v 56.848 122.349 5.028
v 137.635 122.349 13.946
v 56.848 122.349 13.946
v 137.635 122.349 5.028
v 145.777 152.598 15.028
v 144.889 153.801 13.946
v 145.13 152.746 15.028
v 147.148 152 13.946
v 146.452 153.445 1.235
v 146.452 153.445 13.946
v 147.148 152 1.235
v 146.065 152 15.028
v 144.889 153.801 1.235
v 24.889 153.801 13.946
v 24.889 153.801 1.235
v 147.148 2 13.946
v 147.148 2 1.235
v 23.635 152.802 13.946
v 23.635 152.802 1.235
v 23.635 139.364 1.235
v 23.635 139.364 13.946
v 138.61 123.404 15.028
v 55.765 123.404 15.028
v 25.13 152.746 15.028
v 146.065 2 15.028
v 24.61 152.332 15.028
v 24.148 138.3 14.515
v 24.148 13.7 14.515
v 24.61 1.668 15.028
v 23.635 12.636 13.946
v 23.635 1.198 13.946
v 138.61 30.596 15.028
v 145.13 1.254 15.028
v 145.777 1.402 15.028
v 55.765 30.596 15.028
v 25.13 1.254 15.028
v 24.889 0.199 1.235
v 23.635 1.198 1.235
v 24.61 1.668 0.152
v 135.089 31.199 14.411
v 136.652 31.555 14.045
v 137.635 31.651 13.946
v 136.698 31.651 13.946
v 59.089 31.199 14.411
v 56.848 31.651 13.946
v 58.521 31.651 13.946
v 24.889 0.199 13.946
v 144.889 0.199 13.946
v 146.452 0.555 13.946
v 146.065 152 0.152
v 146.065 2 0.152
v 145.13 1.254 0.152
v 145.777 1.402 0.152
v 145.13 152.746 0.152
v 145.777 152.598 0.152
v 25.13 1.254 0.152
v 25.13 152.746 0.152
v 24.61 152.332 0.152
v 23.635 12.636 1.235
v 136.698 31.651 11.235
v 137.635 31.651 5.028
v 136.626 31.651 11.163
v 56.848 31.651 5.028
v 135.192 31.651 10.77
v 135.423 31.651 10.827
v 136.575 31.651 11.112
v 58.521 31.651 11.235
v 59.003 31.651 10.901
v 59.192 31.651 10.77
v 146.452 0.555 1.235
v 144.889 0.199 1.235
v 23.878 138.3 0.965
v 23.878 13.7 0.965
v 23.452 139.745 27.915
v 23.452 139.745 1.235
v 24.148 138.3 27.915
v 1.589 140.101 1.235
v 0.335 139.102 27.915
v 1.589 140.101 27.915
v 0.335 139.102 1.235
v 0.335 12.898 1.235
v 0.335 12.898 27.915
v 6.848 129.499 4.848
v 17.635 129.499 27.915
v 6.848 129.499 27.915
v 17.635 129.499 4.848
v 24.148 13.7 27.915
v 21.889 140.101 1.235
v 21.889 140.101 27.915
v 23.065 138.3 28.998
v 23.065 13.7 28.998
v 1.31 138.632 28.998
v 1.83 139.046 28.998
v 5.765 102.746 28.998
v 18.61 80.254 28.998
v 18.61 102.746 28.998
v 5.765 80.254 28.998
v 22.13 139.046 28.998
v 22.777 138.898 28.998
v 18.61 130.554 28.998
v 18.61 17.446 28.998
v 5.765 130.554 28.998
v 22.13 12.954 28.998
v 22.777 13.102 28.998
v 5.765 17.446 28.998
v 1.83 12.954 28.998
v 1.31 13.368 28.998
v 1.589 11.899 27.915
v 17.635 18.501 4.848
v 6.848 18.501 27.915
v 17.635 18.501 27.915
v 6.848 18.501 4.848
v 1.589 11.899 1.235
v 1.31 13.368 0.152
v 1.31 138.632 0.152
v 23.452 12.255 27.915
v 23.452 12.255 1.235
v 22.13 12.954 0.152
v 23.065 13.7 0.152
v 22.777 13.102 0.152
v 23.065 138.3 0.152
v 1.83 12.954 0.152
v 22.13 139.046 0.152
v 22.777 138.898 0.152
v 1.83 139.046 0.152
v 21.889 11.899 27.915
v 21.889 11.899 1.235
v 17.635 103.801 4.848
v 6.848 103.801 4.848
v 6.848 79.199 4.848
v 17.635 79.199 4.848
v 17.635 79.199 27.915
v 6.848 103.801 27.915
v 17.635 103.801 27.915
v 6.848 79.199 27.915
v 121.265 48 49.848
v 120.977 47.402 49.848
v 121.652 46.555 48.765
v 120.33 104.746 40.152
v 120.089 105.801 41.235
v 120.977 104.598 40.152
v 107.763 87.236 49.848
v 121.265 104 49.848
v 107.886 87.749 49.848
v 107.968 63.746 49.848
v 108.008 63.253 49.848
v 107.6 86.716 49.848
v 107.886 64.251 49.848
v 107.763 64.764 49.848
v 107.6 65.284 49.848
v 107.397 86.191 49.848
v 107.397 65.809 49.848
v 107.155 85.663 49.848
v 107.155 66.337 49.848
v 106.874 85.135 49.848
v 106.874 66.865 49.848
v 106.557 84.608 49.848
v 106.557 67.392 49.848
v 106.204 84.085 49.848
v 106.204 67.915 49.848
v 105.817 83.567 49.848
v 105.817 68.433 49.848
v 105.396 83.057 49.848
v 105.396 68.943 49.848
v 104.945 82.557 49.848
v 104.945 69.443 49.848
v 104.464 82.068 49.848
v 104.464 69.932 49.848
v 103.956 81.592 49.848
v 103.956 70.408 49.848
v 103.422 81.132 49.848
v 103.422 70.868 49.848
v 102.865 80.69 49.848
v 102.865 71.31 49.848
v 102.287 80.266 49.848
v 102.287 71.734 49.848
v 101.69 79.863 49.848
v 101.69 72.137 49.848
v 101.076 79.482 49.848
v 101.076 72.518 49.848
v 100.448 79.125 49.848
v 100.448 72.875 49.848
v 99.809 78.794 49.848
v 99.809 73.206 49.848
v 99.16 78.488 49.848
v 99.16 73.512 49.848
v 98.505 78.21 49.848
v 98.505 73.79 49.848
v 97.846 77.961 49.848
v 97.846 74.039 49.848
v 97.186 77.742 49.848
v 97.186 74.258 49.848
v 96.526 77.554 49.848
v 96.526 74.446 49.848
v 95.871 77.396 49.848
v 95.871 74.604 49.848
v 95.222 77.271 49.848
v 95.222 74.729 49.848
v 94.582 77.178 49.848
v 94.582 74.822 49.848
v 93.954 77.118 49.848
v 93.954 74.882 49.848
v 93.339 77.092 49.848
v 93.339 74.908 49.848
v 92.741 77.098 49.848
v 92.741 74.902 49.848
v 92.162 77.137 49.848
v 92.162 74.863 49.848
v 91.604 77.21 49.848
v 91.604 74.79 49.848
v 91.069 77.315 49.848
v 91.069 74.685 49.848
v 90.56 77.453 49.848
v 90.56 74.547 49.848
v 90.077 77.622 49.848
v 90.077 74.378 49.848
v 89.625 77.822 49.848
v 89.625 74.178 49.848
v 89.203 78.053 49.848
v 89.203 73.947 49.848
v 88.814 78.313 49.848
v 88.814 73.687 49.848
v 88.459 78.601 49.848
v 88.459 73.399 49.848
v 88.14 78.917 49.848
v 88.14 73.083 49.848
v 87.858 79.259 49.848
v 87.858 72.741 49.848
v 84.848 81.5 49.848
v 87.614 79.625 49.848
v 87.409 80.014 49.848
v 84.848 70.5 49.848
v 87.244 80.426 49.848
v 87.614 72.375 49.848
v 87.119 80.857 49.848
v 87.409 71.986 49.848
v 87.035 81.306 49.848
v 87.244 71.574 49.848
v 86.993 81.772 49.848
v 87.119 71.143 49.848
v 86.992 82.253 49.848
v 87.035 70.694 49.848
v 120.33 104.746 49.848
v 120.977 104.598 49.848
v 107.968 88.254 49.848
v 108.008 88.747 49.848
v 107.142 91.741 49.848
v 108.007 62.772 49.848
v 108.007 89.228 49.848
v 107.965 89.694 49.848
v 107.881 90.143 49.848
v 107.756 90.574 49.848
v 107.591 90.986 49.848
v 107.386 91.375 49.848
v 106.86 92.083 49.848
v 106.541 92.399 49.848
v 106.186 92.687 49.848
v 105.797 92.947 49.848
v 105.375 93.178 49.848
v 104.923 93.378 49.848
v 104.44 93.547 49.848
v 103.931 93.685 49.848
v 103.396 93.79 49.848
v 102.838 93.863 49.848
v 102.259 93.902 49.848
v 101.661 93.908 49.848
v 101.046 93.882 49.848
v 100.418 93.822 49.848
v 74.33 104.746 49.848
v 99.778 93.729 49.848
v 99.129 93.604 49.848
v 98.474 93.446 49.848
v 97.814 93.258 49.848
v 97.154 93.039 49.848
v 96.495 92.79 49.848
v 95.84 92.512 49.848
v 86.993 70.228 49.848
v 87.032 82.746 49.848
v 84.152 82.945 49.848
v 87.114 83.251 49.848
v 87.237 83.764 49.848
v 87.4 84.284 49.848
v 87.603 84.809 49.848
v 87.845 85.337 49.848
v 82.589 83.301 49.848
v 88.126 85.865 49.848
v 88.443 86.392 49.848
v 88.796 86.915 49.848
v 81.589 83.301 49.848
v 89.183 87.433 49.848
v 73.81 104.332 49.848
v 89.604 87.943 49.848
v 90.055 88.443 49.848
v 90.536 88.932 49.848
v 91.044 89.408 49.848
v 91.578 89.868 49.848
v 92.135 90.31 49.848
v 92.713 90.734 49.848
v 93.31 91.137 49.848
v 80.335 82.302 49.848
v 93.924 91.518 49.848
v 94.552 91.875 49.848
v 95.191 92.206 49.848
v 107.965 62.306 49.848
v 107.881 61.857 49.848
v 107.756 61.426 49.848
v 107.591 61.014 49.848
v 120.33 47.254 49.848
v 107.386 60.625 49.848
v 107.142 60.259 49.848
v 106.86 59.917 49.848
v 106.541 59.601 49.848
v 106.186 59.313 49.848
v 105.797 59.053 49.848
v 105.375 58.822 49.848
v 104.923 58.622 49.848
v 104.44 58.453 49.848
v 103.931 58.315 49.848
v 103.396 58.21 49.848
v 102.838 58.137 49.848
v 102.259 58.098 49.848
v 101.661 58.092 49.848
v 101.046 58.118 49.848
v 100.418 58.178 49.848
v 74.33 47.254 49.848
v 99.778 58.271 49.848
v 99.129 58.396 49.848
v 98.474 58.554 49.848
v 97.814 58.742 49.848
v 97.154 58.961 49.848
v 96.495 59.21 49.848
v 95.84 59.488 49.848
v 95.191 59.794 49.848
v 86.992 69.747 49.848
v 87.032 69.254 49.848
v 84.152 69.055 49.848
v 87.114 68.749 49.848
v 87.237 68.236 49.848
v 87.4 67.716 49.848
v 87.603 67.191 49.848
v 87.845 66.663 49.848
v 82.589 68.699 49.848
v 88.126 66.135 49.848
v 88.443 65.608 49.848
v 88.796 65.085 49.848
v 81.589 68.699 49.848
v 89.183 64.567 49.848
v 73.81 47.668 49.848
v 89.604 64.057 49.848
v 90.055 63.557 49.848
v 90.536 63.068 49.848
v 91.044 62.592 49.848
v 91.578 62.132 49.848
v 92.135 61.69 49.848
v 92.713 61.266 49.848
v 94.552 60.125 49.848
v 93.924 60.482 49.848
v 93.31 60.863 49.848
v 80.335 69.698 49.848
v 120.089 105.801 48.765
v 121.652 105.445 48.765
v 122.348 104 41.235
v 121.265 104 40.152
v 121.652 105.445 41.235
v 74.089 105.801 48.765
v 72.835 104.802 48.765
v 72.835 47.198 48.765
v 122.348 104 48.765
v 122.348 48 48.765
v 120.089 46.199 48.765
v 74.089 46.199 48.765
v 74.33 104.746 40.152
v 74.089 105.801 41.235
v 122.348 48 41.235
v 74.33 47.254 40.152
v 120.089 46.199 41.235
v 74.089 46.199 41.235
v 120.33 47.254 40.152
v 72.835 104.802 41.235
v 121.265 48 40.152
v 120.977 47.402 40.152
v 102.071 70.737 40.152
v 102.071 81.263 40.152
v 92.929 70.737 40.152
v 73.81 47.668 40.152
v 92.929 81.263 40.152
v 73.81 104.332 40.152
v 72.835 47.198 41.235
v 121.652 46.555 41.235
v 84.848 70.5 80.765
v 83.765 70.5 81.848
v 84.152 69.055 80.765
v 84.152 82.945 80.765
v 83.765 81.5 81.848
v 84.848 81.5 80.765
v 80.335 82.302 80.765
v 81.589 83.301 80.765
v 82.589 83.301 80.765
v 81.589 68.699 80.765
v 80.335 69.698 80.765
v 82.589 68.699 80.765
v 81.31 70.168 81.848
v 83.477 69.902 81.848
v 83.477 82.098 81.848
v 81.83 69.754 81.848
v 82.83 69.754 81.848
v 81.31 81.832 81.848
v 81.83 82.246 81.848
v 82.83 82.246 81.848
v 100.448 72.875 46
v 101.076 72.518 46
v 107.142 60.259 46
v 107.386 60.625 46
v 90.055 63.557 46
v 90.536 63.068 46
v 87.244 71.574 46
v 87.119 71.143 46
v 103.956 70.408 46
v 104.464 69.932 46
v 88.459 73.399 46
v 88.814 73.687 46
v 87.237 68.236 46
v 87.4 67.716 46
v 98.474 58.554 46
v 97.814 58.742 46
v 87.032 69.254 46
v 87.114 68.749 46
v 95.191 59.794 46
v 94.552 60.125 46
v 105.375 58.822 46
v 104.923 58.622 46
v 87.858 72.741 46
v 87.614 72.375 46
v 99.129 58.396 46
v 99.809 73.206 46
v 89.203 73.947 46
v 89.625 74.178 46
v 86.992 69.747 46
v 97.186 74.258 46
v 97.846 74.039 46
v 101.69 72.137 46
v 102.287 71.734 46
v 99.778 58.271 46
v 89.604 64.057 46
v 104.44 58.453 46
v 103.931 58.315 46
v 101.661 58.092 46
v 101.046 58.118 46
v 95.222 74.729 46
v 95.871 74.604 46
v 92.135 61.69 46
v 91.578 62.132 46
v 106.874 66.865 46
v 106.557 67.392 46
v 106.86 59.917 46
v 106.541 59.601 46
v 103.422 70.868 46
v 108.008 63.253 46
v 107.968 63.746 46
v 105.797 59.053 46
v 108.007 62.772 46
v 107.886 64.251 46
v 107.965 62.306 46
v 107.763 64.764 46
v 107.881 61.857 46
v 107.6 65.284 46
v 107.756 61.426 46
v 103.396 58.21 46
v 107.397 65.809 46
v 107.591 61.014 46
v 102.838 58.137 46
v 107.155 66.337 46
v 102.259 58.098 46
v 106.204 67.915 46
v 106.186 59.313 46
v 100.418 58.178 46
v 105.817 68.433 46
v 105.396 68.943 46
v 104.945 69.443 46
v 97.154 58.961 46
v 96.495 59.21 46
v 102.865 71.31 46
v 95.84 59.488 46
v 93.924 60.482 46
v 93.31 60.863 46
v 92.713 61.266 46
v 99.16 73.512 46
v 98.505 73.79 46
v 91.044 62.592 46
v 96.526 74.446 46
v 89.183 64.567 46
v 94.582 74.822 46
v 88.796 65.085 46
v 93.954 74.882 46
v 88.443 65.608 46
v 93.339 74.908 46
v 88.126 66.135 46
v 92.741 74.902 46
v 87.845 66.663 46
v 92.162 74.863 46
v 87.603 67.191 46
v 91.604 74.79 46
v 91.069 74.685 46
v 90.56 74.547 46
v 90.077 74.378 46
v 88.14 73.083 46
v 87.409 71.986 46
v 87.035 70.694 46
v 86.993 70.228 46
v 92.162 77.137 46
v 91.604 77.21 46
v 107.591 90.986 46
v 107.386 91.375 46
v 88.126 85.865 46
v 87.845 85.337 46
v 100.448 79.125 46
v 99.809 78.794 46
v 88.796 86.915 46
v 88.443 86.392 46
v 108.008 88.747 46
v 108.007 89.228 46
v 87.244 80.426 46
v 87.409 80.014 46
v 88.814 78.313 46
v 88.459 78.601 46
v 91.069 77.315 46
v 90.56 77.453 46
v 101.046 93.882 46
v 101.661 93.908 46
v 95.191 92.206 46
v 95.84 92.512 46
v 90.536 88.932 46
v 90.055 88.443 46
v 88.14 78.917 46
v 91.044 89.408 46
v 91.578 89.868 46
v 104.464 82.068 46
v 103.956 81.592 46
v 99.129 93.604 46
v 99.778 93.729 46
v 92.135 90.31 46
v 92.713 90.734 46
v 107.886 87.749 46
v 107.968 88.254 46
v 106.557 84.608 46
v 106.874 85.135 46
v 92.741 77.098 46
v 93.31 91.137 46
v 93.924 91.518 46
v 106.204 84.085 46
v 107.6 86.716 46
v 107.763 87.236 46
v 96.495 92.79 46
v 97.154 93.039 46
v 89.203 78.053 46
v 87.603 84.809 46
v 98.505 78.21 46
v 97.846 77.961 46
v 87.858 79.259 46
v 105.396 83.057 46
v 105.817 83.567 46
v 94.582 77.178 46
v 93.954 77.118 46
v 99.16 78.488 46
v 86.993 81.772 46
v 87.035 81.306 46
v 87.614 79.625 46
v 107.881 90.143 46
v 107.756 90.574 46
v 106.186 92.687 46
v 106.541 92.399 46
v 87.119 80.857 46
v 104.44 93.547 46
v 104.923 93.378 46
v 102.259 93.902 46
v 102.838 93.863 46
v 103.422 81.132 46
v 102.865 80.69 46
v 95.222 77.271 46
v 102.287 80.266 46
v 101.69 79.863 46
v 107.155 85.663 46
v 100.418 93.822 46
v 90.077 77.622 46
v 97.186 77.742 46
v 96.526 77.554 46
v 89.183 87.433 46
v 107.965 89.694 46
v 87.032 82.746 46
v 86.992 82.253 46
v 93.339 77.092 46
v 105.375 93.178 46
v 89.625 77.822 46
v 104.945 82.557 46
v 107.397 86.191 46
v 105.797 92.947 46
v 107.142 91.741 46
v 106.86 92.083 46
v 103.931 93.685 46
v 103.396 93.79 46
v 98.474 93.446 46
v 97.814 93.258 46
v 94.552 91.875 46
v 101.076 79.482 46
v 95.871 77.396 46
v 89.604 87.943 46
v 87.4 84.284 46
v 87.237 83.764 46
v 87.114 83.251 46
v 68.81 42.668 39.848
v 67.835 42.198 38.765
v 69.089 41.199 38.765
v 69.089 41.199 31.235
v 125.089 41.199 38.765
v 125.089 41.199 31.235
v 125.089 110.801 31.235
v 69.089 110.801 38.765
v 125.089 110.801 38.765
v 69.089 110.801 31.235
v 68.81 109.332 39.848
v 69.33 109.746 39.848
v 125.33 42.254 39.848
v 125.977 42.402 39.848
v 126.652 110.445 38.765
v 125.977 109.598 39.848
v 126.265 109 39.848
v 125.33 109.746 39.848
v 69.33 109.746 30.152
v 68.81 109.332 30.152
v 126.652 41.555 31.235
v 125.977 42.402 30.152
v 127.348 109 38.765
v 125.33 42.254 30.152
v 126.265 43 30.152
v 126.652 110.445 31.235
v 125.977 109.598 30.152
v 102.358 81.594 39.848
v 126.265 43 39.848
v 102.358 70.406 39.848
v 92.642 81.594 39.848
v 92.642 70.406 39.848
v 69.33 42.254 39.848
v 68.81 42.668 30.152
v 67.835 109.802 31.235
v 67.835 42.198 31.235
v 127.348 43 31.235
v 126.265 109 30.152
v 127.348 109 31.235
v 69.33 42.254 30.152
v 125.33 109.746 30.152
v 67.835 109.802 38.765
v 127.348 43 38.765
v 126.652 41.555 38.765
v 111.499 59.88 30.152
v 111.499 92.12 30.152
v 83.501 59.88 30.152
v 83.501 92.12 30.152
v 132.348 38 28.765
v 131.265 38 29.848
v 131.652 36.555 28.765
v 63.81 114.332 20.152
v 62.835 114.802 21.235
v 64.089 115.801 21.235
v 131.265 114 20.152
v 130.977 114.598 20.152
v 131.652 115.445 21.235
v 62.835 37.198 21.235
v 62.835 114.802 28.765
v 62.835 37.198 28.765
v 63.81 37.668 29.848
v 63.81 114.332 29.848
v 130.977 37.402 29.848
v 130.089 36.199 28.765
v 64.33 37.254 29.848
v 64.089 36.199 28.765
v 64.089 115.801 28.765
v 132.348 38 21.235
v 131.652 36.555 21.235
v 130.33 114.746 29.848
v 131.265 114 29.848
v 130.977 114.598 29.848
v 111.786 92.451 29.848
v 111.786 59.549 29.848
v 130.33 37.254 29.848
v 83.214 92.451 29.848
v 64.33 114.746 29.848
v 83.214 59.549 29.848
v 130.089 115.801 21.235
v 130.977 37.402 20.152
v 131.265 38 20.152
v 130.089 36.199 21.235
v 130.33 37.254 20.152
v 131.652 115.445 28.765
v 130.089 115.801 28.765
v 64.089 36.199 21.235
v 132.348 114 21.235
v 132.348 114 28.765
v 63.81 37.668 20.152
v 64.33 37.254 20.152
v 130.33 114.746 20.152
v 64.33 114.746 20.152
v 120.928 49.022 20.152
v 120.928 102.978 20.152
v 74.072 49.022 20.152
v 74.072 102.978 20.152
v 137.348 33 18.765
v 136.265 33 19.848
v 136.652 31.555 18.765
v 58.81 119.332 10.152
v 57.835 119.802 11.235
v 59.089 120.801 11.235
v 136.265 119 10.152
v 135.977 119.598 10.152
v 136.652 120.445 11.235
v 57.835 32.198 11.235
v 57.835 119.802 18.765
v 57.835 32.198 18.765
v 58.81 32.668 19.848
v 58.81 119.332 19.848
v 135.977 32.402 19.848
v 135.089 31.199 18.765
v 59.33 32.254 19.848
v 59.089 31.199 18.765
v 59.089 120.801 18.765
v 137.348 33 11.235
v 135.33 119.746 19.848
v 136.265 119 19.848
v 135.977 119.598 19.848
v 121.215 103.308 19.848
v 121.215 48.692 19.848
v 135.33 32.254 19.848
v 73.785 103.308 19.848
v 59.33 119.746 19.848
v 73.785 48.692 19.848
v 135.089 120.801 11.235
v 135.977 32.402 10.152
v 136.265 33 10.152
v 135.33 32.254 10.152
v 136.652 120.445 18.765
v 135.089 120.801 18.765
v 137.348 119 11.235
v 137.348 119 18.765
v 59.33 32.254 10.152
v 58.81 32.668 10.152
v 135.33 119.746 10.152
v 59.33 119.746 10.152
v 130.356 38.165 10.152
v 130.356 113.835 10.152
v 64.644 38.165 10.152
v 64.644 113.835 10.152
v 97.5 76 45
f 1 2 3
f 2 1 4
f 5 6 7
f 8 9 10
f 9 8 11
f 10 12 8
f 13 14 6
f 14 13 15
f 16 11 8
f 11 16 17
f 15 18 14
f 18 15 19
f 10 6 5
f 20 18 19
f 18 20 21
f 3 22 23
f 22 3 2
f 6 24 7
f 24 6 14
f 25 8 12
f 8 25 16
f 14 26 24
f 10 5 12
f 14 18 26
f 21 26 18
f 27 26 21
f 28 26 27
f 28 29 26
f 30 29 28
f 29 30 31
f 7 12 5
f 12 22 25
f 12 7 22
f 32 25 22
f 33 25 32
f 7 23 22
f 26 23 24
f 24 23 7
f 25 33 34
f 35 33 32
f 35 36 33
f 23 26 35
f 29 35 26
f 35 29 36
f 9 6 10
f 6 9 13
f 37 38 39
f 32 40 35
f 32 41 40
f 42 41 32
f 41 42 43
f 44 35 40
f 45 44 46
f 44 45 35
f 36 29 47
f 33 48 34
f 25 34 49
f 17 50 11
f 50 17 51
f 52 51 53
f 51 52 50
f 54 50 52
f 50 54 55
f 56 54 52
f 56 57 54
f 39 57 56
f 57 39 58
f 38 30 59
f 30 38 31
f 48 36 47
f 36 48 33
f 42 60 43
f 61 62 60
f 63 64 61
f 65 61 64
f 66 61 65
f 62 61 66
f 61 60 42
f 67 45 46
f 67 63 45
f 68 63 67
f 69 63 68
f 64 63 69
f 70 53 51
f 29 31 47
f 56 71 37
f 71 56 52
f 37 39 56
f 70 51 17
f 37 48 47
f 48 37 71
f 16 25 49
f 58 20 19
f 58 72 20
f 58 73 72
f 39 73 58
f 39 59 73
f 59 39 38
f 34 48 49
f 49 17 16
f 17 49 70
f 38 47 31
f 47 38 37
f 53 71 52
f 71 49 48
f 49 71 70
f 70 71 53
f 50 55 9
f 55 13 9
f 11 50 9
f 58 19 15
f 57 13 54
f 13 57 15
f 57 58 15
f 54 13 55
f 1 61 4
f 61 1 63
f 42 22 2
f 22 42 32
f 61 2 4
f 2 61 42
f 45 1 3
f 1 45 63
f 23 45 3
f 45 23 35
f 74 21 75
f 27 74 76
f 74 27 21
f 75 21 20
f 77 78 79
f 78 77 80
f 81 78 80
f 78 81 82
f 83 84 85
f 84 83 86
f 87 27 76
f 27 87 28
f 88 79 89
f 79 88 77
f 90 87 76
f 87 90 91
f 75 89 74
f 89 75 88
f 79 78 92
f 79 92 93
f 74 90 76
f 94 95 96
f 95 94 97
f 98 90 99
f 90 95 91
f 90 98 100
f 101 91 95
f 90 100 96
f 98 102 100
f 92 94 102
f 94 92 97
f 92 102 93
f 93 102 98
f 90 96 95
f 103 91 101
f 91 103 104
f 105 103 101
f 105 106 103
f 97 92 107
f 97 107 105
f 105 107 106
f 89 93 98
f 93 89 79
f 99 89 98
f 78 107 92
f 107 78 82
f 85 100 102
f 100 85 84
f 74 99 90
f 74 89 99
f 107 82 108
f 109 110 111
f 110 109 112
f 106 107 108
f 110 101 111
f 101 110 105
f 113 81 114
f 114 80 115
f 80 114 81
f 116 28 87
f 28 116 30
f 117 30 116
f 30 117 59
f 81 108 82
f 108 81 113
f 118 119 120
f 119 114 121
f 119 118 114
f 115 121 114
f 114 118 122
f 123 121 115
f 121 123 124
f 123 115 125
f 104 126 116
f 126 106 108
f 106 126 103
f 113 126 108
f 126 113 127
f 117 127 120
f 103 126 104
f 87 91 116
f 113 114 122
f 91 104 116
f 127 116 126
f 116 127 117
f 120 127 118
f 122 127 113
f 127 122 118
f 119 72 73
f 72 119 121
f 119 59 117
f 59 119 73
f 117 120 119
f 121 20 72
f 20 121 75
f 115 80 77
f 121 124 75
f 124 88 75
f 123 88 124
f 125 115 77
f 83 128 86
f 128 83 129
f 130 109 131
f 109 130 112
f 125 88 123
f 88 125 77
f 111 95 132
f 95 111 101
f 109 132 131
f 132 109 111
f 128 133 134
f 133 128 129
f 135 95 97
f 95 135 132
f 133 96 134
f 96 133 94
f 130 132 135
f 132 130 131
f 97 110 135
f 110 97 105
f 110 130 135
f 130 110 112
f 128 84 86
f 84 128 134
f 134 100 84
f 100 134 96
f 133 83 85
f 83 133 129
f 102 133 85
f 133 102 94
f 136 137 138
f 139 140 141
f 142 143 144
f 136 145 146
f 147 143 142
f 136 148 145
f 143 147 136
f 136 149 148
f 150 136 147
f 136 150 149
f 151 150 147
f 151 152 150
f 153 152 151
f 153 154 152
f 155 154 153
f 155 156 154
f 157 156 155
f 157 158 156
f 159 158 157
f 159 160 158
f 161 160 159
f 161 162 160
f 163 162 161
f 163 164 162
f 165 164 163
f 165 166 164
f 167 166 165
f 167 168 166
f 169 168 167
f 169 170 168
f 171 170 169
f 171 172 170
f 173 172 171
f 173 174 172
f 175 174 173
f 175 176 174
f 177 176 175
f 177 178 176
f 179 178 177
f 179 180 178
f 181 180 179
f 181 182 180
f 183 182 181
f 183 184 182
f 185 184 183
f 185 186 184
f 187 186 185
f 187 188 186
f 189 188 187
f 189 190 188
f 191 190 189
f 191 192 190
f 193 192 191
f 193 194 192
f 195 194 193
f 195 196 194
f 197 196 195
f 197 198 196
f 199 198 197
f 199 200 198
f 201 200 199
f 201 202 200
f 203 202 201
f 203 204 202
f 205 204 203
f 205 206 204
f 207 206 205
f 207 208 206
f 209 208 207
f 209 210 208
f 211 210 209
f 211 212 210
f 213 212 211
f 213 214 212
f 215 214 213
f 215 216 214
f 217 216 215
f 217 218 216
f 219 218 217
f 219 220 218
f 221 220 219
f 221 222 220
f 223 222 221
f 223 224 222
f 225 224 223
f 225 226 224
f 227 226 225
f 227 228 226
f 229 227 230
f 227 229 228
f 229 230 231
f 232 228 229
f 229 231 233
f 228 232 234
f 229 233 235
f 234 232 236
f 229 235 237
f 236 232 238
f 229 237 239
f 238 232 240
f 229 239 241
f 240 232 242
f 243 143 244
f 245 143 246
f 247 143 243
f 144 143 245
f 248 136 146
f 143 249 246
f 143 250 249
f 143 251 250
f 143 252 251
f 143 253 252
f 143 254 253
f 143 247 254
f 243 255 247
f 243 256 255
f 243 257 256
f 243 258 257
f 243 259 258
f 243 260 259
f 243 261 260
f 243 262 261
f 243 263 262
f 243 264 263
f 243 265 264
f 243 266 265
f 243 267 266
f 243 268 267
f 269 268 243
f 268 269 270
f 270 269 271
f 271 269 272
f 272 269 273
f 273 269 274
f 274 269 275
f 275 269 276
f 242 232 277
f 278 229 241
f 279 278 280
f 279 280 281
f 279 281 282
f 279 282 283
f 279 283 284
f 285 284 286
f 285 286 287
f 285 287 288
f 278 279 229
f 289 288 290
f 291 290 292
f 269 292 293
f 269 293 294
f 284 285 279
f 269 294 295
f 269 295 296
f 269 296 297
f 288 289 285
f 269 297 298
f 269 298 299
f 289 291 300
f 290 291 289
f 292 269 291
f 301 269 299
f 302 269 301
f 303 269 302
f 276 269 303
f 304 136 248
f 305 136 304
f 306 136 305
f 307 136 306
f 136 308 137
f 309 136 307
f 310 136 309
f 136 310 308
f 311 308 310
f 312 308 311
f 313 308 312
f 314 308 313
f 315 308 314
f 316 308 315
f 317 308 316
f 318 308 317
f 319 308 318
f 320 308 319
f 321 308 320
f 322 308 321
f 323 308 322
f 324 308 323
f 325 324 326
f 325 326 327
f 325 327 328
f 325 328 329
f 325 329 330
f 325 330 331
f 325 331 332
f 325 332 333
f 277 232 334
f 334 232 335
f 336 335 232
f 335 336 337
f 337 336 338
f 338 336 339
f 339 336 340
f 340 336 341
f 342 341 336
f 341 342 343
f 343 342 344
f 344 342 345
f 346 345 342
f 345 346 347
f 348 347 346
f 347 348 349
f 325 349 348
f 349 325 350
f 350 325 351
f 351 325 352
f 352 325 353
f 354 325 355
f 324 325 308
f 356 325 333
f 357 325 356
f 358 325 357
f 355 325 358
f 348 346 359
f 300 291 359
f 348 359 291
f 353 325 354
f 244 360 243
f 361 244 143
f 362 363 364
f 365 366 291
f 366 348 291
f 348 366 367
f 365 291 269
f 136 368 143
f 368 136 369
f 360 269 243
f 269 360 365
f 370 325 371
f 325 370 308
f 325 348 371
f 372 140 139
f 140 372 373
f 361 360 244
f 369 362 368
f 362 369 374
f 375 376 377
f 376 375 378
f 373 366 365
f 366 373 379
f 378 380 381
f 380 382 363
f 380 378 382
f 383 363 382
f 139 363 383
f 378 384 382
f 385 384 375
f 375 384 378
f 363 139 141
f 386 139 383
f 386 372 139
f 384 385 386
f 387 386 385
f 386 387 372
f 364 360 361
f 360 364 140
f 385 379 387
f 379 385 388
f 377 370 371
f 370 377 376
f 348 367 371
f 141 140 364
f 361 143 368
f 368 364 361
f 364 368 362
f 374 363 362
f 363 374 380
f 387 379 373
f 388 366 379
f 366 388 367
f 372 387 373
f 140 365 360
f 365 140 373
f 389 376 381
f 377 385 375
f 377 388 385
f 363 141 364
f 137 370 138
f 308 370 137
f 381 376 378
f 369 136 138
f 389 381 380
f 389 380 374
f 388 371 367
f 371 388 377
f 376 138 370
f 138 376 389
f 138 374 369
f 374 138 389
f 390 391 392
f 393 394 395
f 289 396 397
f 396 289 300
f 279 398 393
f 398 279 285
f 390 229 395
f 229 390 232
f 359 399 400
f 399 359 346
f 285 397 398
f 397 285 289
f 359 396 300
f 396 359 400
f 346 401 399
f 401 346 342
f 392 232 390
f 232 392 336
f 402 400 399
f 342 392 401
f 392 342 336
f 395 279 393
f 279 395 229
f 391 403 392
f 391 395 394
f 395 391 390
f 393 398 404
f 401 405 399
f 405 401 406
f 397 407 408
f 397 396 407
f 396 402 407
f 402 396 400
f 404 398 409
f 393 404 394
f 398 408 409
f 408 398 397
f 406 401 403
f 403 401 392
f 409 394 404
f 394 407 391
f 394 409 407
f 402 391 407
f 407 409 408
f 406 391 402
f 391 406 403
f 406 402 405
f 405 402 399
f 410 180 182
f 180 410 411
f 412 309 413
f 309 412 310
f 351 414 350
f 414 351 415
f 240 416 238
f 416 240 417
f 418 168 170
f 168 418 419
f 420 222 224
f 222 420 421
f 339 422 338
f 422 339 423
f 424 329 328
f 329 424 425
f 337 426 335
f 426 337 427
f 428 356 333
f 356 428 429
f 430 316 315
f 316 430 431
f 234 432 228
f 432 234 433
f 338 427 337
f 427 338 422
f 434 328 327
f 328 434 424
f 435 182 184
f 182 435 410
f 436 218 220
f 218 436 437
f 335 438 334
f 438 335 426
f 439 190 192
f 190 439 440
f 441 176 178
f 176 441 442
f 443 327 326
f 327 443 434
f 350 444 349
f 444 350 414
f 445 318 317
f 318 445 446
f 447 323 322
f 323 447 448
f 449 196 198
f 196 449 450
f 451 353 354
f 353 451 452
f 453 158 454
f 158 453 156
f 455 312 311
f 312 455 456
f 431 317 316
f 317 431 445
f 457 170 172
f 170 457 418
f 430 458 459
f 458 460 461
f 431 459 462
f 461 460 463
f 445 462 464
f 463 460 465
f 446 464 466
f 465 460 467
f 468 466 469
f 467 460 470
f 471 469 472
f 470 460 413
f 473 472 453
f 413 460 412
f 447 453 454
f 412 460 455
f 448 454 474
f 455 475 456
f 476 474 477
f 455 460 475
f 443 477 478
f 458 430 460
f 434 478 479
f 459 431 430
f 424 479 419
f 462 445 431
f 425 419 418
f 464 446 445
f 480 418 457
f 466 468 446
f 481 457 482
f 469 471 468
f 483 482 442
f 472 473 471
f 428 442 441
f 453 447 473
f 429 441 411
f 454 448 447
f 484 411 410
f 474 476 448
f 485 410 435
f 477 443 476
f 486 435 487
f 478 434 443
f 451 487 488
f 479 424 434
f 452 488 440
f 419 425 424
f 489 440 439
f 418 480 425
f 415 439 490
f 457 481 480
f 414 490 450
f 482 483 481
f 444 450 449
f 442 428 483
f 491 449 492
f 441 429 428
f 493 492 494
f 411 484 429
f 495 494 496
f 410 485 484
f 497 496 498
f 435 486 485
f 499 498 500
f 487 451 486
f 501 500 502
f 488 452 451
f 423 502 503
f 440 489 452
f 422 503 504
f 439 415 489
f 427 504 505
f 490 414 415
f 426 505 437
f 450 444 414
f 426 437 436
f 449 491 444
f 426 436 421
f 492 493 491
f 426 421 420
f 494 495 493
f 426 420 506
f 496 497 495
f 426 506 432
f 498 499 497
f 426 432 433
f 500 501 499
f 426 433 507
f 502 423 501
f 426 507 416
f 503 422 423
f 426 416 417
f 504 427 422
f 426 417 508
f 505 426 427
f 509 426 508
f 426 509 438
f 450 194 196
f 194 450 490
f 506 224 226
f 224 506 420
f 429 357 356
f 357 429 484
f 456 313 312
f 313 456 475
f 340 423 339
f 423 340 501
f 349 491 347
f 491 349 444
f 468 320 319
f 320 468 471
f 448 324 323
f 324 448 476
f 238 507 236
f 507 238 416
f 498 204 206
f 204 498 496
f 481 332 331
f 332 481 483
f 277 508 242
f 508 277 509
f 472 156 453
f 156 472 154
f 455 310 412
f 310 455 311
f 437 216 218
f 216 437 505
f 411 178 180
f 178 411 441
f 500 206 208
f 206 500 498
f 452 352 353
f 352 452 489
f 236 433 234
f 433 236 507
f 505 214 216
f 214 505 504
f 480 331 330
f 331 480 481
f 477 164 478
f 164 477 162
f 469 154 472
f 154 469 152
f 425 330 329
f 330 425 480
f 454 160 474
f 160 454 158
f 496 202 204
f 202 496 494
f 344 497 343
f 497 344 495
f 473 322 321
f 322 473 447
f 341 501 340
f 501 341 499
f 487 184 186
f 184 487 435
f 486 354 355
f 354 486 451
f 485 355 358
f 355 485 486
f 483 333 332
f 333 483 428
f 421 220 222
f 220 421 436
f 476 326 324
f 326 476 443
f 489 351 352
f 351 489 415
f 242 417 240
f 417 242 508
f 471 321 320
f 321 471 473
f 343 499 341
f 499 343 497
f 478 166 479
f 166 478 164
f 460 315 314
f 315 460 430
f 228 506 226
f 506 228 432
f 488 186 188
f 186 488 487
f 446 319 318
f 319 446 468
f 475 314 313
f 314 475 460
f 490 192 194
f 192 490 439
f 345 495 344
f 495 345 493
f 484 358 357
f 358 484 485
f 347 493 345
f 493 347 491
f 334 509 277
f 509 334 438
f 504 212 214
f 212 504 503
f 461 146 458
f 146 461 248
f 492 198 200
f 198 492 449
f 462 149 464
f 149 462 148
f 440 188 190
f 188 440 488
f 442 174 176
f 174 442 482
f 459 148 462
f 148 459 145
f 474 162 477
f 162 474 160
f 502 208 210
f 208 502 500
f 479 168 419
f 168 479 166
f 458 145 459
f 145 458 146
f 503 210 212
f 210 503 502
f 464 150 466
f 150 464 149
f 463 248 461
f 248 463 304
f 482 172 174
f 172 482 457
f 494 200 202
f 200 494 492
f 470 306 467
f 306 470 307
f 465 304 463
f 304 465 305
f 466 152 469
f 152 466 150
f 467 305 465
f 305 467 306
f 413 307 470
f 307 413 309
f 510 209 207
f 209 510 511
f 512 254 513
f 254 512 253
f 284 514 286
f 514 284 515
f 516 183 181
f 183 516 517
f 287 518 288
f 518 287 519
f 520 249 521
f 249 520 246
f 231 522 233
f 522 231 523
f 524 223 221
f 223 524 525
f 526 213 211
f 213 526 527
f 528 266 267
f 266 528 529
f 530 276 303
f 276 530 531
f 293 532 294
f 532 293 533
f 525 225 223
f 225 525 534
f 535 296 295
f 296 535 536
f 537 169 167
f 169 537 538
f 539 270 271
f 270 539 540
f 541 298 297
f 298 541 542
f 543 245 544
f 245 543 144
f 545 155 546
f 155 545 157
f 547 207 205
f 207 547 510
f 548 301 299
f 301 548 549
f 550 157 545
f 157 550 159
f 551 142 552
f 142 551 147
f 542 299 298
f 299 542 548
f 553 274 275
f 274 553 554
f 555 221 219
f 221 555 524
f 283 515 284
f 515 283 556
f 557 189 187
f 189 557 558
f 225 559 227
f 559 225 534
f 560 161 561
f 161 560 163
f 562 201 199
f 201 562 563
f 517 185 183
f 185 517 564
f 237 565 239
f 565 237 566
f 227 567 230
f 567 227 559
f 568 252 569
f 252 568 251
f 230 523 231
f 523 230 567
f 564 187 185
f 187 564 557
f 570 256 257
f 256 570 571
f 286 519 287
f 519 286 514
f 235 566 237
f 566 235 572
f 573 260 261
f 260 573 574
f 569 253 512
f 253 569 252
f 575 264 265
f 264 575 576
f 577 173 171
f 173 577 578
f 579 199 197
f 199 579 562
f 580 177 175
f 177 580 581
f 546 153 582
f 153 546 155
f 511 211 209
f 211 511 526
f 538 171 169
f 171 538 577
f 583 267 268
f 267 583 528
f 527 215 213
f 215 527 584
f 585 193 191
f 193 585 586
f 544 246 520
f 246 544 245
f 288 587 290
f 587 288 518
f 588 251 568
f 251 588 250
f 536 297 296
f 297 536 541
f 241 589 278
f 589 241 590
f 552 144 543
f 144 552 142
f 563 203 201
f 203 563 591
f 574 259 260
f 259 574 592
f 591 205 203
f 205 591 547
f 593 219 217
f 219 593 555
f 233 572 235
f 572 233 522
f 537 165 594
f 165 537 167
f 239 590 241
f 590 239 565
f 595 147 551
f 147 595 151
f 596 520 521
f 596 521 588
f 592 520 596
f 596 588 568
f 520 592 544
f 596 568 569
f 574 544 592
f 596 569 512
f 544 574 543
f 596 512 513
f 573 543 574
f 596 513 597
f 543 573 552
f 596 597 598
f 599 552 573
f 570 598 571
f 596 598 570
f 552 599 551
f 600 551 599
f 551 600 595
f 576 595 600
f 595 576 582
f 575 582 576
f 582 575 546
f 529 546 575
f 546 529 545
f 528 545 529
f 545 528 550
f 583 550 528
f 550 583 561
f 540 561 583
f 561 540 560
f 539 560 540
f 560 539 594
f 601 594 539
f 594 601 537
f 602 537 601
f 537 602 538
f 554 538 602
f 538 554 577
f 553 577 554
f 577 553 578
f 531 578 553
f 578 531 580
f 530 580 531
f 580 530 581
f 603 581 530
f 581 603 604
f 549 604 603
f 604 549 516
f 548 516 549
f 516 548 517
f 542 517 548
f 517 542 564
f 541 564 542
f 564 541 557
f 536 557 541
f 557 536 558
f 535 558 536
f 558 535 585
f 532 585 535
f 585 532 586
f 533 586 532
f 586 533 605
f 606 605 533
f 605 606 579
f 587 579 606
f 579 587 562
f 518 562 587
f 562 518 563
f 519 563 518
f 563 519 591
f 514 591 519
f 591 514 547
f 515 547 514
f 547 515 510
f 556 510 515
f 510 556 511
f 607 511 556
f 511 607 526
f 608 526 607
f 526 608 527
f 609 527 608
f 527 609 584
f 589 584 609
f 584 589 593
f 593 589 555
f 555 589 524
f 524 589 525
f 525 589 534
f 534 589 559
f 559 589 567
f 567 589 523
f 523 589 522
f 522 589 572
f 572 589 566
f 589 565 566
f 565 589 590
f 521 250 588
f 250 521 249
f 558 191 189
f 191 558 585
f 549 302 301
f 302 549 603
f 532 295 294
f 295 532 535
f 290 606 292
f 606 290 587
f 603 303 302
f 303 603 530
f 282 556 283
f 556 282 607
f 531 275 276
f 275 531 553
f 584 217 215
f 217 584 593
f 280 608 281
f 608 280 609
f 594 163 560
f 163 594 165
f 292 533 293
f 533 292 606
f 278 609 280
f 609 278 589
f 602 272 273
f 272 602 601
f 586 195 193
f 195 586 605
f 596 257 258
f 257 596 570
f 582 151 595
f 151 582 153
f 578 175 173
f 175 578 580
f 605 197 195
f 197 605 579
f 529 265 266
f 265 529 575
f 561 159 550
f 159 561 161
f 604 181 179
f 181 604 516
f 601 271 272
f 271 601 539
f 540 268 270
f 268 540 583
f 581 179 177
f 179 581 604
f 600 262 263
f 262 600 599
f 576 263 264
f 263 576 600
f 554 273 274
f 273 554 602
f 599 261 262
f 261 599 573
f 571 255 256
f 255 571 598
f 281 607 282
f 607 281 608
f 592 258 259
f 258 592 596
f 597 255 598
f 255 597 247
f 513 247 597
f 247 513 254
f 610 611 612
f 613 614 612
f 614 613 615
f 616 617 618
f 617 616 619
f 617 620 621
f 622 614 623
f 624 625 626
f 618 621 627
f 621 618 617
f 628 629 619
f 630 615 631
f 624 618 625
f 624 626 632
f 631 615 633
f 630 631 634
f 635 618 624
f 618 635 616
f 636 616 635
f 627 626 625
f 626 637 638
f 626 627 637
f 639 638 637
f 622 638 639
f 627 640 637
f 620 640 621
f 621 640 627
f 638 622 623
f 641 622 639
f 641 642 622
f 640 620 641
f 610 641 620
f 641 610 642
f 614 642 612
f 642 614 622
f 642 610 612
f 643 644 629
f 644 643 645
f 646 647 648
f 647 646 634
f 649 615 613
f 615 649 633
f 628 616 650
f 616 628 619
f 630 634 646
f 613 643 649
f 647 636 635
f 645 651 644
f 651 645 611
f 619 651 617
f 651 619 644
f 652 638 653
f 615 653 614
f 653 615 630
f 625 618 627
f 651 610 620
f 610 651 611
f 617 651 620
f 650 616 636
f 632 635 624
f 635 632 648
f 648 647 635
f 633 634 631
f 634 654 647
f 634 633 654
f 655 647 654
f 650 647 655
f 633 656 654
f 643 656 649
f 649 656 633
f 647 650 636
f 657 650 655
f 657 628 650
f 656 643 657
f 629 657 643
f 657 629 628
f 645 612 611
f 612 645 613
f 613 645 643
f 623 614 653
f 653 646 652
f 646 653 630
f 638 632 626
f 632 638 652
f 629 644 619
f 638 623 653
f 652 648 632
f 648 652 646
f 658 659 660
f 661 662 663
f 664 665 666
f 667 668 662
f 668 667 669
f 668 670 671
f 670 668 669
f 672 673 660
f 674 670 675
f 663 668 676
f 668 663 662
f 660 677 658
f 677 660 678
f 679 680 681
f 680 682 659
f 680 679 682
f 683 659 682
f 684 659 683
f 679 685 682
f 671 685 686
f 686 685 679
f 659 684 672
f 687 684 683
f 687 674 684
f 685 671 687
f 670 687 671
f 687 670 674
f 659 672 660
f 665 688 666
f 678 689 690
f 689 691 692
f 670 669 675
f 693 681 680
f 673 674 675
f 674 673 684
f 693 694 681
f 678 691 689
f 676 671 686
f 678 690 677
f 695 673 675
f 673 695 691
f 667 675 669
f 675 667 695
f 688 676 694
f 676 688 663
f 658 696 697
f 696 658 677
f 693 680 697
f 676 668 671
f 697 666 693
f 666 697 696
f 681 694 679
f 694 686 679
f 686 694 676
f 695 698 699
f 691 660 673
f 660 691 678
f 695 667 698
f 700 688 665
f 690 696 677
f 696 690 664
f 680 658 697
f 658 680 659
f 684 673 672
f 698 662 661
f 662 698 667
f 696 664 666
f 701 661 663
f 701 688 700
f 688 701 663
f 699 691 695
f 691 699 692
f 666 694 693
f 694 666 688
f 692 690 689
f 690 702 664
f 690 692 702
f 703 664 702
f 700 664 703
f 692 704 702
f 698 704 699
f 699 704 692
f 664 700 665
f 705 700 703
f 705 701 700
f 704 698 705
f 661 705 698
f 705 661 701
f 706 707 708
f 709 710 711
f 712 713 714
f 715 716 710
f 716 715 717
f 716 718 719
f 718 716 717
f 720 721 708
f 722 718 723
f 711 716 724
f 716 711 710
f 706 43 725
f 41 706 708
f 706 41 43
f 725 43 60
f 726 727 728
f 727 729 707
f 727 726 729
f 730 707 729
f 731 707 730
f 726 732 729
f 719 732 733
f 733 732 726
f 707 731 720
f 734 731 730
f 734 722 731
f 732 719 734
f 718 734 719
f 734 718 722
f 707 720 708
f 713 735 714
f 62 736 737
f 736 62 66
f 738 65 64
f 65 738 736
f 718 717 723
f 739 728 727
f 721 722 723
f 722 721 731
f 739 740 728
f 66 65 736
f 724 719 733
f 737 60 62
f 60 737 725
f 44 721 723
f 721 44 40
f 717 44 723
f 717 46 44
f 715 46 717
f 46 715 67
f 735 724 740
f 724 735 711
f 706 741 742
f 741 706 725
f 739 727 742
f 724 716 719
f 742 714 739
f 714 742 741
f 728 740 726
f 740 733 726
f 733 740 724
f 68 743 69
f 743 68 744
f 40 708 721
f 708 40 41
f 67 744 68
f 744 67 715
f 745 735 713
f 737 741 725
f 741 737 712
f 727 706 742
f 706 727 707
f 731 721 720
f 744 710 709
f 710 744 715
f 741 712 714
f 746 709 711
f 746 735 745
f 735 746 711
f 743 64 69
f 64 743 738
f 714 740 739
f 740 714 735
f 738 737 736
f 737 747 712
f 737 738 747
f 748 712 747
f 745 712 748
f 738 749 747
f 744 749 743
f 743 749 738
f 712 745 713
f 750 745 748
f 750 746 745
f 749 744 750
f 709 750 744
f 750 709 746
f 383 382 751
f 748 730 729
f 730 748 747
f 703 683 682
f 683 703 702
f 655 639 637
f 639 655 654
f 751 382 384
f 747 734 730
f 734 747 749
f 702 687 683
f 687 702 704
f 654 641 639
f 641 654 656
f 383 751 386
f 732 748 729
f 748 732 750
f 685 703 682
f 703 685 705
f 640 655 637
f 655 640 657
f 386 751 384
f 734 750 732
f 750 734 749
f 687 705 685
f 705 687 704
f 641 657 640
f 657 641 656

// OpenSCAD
// file: libraries/SnapLib/SnapLib.0.36.scad
/*simple Snap library based on "Snap-Fit Joints for Plastics - A Design Guid" by Bayer MaterialScience LLC 
  http://fab.cba.mit.edu/classes/S62.12/people/vernelle.noel/Plastic_Snap_fit_design.pdf
 
 on http://www.thingiverse.com/thing:1860118
 
    by fpetrac Fausto Petraccone fpetrac@gmail.com 
    Licensed under the Creative Commons - Attribution - Non-Commercial license.
*/

/*Rev
    SnapLib 0.36.scad: added SnapHoleY function  
    SnapLib 0.35.scad: on RSnapY added a check to avioid interference of lobes during closure; on RRSnappY added a check to avioid overlapped lobes.
    SnapLib 0.30.scad  added function Hsnap and Snap to calculate the snap H or Y for cantilever snap
    SnapLib 0.25.scad  added Scale factor f to reduce the calculate value h or y (this mantain the snap on unbreakable zone when f>1)
    SnapLib 0.20.scad  Bug Fix
    SnapLib 0.10.scad  added RSnapY RRSnapY
    SnapLib 0.00.scad  first release
*/


/*
eps=0.5*6/100;//Elongation at break of PLA=6%
eps=0.5*12/100;//Elongation at break of ABS=12%
eps=0.5*18/100;//Elongation at break of PETG=18%
*/

eps=0.5*6/100;//Elongation at break of PLA=6%


function Hsnap(l,y,f)= (1.09/f)*(eps*pow(l,2))/(y);
function Ysnap(l,h,f)= (1.09/f)*(eps*pow(l,2))/(h);

//SnapH(l,y,a,b,f=1) Define y calculate h and divide the calculte h value to a factor f
module SnapH(l,y,a,b,f=1)   
{
    h=Hsnap(l,y,f);
    p=y;
    echo("h is",h);
linear_extrude(height = b, center = f, convexity = 10, twist = 0)
polygon([[0,0],[l,0],[l,y],[l+p,y],[l+p+(y+h/4)/tan(a),-h/4],[l,-h/2],[0,-h]]);
}
//SnapY(l,h,a,b,f=1) Define h calculate y and divide the calculte y value to a factor f
module SnapY(l,h,a,b,f=1)
{
    y=Ysnap(l,h,f);
    p=y;
    echo("y is", y);
linear_extrude(height = b, center = f, convexity = 10, twist = 0)
polygon([[0,0],[l,0],[l,y],[l+p,y],[l+p+(y+h/4)/tan(a),-h/4],[l,-h/2],[0,-h]]);
}
//SnapHoleY(l,h,a,b,f=1,Pr=2) Define h calculate y and divide the calculte y value to a factor f the total hole depth is h*PR
module SnapHoleY(l,h,a,b,f=1,Pr=2){
        //%SnapY(l,h,a,b);  
        y=Ysnap(l,h,f);
        YY=Pr*h;//depth Y;
        XX=1.1*(y+(y+h/4)/tan(a)); //Altezza totale +10%
        ZZ=0+b; //largezza piu tolleranza
        union(){
            translate([0,-YY,(b-ZZ)/2])cube([l,YY,ZZ],center=false); //gambo
            translate([l,-YY,(b-ZZ)/2])cube([XX,YY+y,ZZ],center=false);//testa
        }    
 }



//Define h calculate y and divide the calculated value to f
module RSnapY(l,h,a,Lobi,r2,f=1,K2=2)   
{
    Theta=180/Lobi;
    y=(1.64/f)*K2*(eps*pow(l,2))/(r2);
    p=y;
    echo("y is", y);
    echo("r1/r2",(r2-h)/r2);
    echo("Theta", Theta);
    echo("r2-h",(r2-h));
    if(((r2-h)>y)&&(h<r2)){ //(r2-h)>y should be (r2-h/2)>y and  h<r2 for scad problem
      for(f=[0:1:Lobi])
          rotate([0,0,Theta*2*f])
              rotate_extrude(angle = Theta, convexity = 2,$fn=200)
                  translate([r2,0,0])
                      mirror([1,-1,0])
                          polygon([[0,0],[l,0],[l,y],[l+p,y],[l+p+(y+h/4)/tan(a),-h/4],[l,-h/2],[0,-h]]);
    }
    else{
      echo ("<b>WARNING:</b>");
      echo("y should be < r2-h ");
      echo("h should be < r2 ");
    }
}
//Define h calculate y and divide the calculated value to f
module RRSnapY(l,h,a,Lobi,r2,f=1,K1=2)
{
    Theta=180/Lobi;
    y=(1.64/f)*K1*(eps*pow(l,2))/(r2);
    p=y;
    echo("y is", y);
    echo("r1/r2",(r2-h)/r2);
    echo("Theta", Theta);
    echo("r2-y",(r2-y));
    if(y<r2){
      for(f=[0:1:Lobi])
          rotate([0,180,Theta*2*f])
              rotate_extrude(angle = Theta, convexity = 2,$fn=200)
                  translate([r2,0,0])
                      mirror([1,1,0])
                          polygon([[0,0],[l,0],[l,y],[l+p,y],[l+p+(y+h/4)/tan(a),-h/4],[l,-h/2],[0,-h]]);
  }
      else{
      echo ("<b>WARNING:</b>");
      echo("y should be < r2 ");
      }
}
// file: utils.scad
// Utilities
use <libraries/SnapLib/SnapLib.0.36.scad>

// Snap Joints

/**
 * doubleCantileverSnap: creates the snap portion of a Cantilever Joint with 2 snap fits
 * x_size: size on x-axis of containing box
 * y_size: size on y-axis of containing box
 * z_size: size on z-axis of containing box
 */
module doubleCantileverSnap(size, tolerance=0.1, position="center") {
    x_size = size[0];
    y_size = size[1];
    z_size = size[2];
    corrected_z = z_size * (1 - tolerance);
    z_offset = (position == "center") ? (tolerance / 2) * z_size : 0;
    single_cantilever_base = y_size / 4;
    single_cantilever_leg_size = x_size / 2;
    // first snap
    translate([0,0,z_offset])
    translate([0, 3 *single_cantilever_base, 0])
    SnapY(l=single_cantilever_leg_size,h=single_cantilever_base,a=25,b=corrected_z);
    // second snap
    translate([0,0,z_offset])
    translate([0, 4 * single_cantilever_base, 0])
    mirror([0,1,0])
    translate([0, 3 *single_cantilever_base, 0])
    SnapY(l=single_cantilever_leg_size,h=single_cantilever_base,a=25,b=corrected_z);
}

/**
 * doubleCantileverHole: creates the hole portion of a Cantilever Joint with 2 snap fits
 * x_size: size on x-axis of containing box
 * y_size: size on y-axis of containing box
 * z_size: size on z-axis of containing box
 */
module doubleCantileverHole(size, tolerance =0.1) {
    x_size = size[0];
    y_size = size[1];
    z_size = size[2];
    ratio = 1 - tolerance;
    single_cantilever_base = y_size / 4;
    single_cantilever_leg_size = x_size / 2;
    overhang = Ysnap(l=single_cantilever_leg_size, h=single_cantilever_base, f=1);
    cube([single_cantilever_leg_size * ratio, single_cantilever_base * ratio, z_size]);
    translate([0, 4 * single_cantilever_base, 0])
    mirror([0,1,0])
    cube([single_cantilever_leg_size * ratio, single_cantilever_base * ratio, z_size]);
    snap_stop = single_cantilever_leg_size+ overhang + (overhang + single_cantilever_base/4)/tan(25);
    back_size = x_size - snap_stop - 3 * overhang;
    translate([snap_stop + 3 * overhang,0,0])
    cube([back_size,y_size,z_size]);
}

/**
 * singleCantileverSnap: creates the snap portion of a Cantilever Joint with 1 snap fit
 * x_size: size on x-axis of containing box
 * y_size: size on y-axis of containing box
 * z_size: size on z-axis of containing box
 */
module singleCantileverSnap(size, tolerance=0.1, position="center") {
    x_size = size[0];
    y_size = size[1];
    z_size = size[2];
    corrected_z = z_size * (1 - tolerance);
    z_offset = (position == "center") ? (tolerance / 2) * z_size : 0;
    single_cantilever_base = y_size / 3;
    single_cantilever_leg_size = x_size / 2;
    // first snap
    translate([0,0,z_offset])
    translate([0, 2 *single_cantilever_base, 0])
    SnapY(l=single_cantilever_leg_size,h=single_cantilever_base,a=25,b=corrected_z);
}

/**
 * singleCantileverHole: creates the hole portion of a Cantilever Joint with 2 snap fits
 * x_size: size on x-axis of containing box
 * y_size: size on y-axis of containing box
 * z_size: size on z-axis of containing box
 */
module singleCantileverHole(size, tolerance =0.1) {
    x_size = size[0];
    y_size = size[1];
    z_size = size[2];
    ratio = 1 - tolerance;
    single_cantilever_base = y_size / 3;
    single_cantilever_leg_size = x_size / 2;
    overhang = Ysnap(l=single_cantilever_leg_size, h=single_cantilever_base, f=1);
    cube([x_size, single_cantilever_base * ratio, z_size]);
    translate([0, 3 * single_cantilever_base, 0])
    mirror([0,1,0])
    cube([single_cantilever_leg_size * ratio, single_cantilever_base * ratio, z_size]);
    snap_stop = single_cantilever_leg_size+ overhang + (overhang + single_cantilever_base/4)/tan(25);
    back_size = x_size - snap_stop - 3 * overhang;
    translate([snap_stop + 3 * overhang,0,0])
    cube([back_size,y_size,z_size]);
}

// GOOD EXAMPLE
// color("red")
// cantileverSnap(7,4,2);
// color("green")
// cantileverHole(7,4,2);

box = [6,3,2];
color("red")
singleCantileverSnap(box, position="center");
color("green")
singleCantileverHole(box);
// main file
// width: 190 top, 188 bottom
// cylinder: 7
// angle: 10deg
// mounting angle: 70% towards center, 45% back

use <utils.scad>

// handle
guide_length = 25;
handle_guide_width = 5;
guide_height = 10;
cylinder_diameter = 7;
cylinder_padding = 4;

module left_handle() {
    difference() {
        union() {
            cube([guide_height,cylinder_diameter + cylinder_padding,handle_guide_width + 10]);
            translate([0,cylinder_diameter + cylinder_padding,0])
            rotate(a=-10,v=[0,0,1])
            union() {
                cube([guide_height,6,handle_guide_width + 10]);
                translate([-1,2,0])
                cube([guide_height+1,4,guide_length]);
            }
        }

        translate([-1,3 + cylinder_padding,12])
        rotate(a=90,v=[0,1,0])
        union() {
            cylinder(h=15,r1=3.5,r2=3.5, $fn=100);
            translate([-handle_guide_width - 0.5,-3.5,0])
            cube([handle_guide_width,7,15]);
        }
    }
}

module left_handle2() {
    translate([2,0,0])
    difference() {
        union() {
            cube([guide_height-4,cylinder_diameter + cylinder_padding,handle_guide_width + 10]);
            translate([0,cylinder_diameter + cylinder_padding,0])
            rotate(a=-10,v=[0,0,1])
            union() {
                cube([guide_height-4,6,handle_guide_width + 10]);
                translate([-1,2,0])
                cube([guide_height-3,4,guide_length-2]);
            }
        }

        translate([-1,3 + cylinder_padding,12])
        rotate(a=90,v=[0,1,0])
        union() {
            cylinder(h=15,r1=5.5,r2=5.5, $fn=100);
            translate([-handle_guide_width - 10.5,-5.5,0])
            cube([handle_guide_width+10,11,15]);
        }
    }
}

// mount
first_mount_length = 50;
mount_width = cylinder_diameter + cylinder_padding-4;
first_mount_angle = 30;
first_mount_height = cos(first_mount_angle) * first_mount_length;
first_mount_translation_width = sin(first_mount_angle) * first_mount_length;

module pyramid_shape() {
    intersection() {
            translate([0,3,0])
            rotate(a=5,v=[1,0,0])
            translate([first_mount_translation_width,0,0])
            cube([guide_height,mount_width,first_mount_height+5]);
            translate([0,-3,0])
            rotate(a=-5,v=[1,0,0])
            translate([first_mount_translation_width,0,0])
            cube([guide_height,mount_width,first_mount_height+5]);
        }
        translate([0,3,0])
        rotate(a=5,v=[1,0,0])
        translate([first_mount_translation_width,0,0])
        cube([guide_height,mount_width,first_mount_height/2+12]);
        translate([0,-3,0])
        rotate(a=-5,v=[1,0,0])
        translate([first_mount_translation_width,0,0])
        cube([guide_height,mount_width,first_mount_height/2+12]);
}

module left_first_mount() {
    translate([first_mount_translation_width,0,0])
    rotate(a=-first_mount_angle,v=[0,1,0])
    cube([guide_height, mount_width, first_mount_length]);
    pyramid_shape();
}

second_mount_length = 100;
second_mount_angle = 70;
second_mount_angle_2 = 20;
second_mount_height = cos(second_mount_angle) * second_mount_length;
second_mount_translation_width = cos(second_mount_angle_2) * second_mount_length;
second_mount_offset = sin(second_mount_angle_2) * sin(second_mount_angle) * second_mount_length;

module left_second_mount() {
    translate([first_mount_translation_width + second_mount_translation_width,second_mount_offset,0])
    rotate(a=second_mount_angle_2,v=[0,0,1])
    rotate(a=-second_mount_angle,v=[0,1,0])
    cube([guide_height, mount_width, second_mount_length]);
}

module left() {
    rotate(a=10,v=[0,0,1])
    union() {
        translate([0,0,first_mount_height + second_mount_height])
        left_handle2();
        translate([0,4,second_mount_height])
        left_first_mount();
        left_second_mount();
    }
}

// joint
//joint_length = 60;
joint_length = 25;
joint_height = 10;

module joint() {
    // original
    translate([first_mount_translation_width+second_mount_translation_width-15,50,0])
    cube([40,joint_length,joint_height]);
}

module everything() {
    left();
    joint();
    //translate([0,base_length,0])
    //mirror([0,1,0])
    //left();
}

module area_to_smooth() {
    translate([-5,0,2])
    cube([125,200,120]);
}

module smoothed() {
    smooth(r=0) {
        everything();
        translate([-5,-5,27+ second_mount_height])
        cube([20,20,20]);
        //translate([-5,base_length-15,27+ second_mount_height])
        //cube([20,20,20]);
        translate([first_mount_translation_width-10,0,second_mount_height-10])
        cube([30,30,20]);
        //translate([first_mount_translation_width-10,base_length-first_mount_translation_width-5,second_mount_height-10])
        //cube([30,30,20]);
       
        translate([100,40,0])
        cube([20,30,30]);
    }
}


//mirror([0,1,0])
//smoothed();
/*union() {
    smoothed();
    minkowski() {
        intersection() {
            smoothed();
            area_to_smooth();
        }
        sphere(2);
    }
}*/

//color("red")
//cube([first_mount_translation_width+second_mount_translation_width-15,70,90]);
//cube([120,50,90]);

smoothing_padding = 2;

// base1

mid_space = (190 - 40 - 25) - (40 + 60);
padding = 0.15;
wall_width = 3;
joint_depth = 24;

base_length = wall_width + padding + smoothing_padding + 60 + smoothing_padding + padding + mid_space + padding + smoothing_padding + 25 + smoothing_padding + padding + wall_width;
base_width = wall_width + padding + smoothing_padding + joint_height + smoothing_padding + padding + wall_width;
base_height = joint_depth + padding + wall_width;

base_center_x = 90;
base_center_height = base_height + (120 - (first_mount_translation_width+second_mount_translation_width-15));

// layer

layer_height = 10;
num_layers = 4;
final_layer_width = 60;
final_layer_length = 50;

// base2

base_2_width = 150;
base_2_length = 120;
base_2_height = base_center_height - (num_layers - 1) * layer_height;
base_2_hole_height = layer_height;
base_2_hole_width = final_layer_width + (num_layers - 1) * layer_height + 2 * smoothing_padding + 2 * padding;
base_2_hole_length = final_layer_length + (num_layers - 1) *layer_height + 2 * smoothing_padding + 2 * padding;

module base1() {
    translate([smoothing_padding,0,0])
    difference() {
        cube([base_width, base_length, base_height]);
        union() {
            translate([wall_width,wall_width,wall_width])
            cube([(padding + smoothing_padding + joint_height + smoothing_padding + padding),(padding + smoothing_padding + 60 + smoothing_padding + padding),(padding + smoothing_padding + joint_depth + 5)]);
            translate([wall_width, (wall_width + padding + 60 + padding + mid_space),wall_width])
            cube([(padding + smoothing_padding + joint_height + smoothing_padding + padding),(padding + smoothing_padding + 25 + smoothing_padding + padding),(padding + smoothing_padding + joint_depth + 5)]);
        }
    }
}

base_2_offset_x = base_width + smoothing_padding * 3 - 1;
hole_start_x = smoothing_padding + wall_width + smoothing_padding + padding + base_center_x - base_2_hole_length / 2;
hole_start_y = (base_2_width - base_2_hole_width) / 2 + smoothing_padding;
hole_start_z = (base_2_height - base_2_hole_height);

module base2() {
    difference() {
        translate([base_2_offset_x,smoothing_padding,0])
        cube([base_2_length,base_2_width,base_2_height]);
        translate([hole_start_x, hole_start_y, hole_start_z])
        cube([base_2_hole_length, base_2_hole_width, base_2_hole_height + 5]);
    }
}

module base() {
    translate([0,((base_2_width - base_length - smoothing_padding) / 2 + smoothing_padding),0])
    base1();
    base2();
}

minkowski() {
    // intersection so we don't go under z-axis
    intersection() {
        base();
        translate([0,0,smoothing_padding])
        cube([200,200,100]);
    }
    sphere(smoothing_padding);
}


// stand
// stand1
/*
feet_y_axis = 25;
feet_x_axis = 15;
feet_bottom_distance = 12;
feet_top_distance = 33;
*/
// stand 3
/*
feet_y_axis = 23;
feet_x_axis = 14;
feet_bottom_distance = 10;
feet_top_distance = 30;
*/

// stand 4
/*
feet_y_axis = 23;
feet_x_axis = 14;
feet_bottom_distance = 9;
feet_top_distance = 30;
*/

// stand 5
/*
feet_y_axis = 23;
feet_x_axis = 14;
feet_bottom_distance = 9;
feet_top_distance = 31;
*/

// stand 6
/*
feet_y_axis = 23;
feet_x_axis = 14;
feet_bottom_distance = 9;
feet_top_distance = 32;
*/

// stand 7
feet_y_axis = 23;
feet_x_axis = 14;
feet_bottom_distance = 9.5;
feet_top_distance = 33;

feet_depth = 4;

feet_angle = asin(((feet_top_distance - feet_bottom_distance) / 2) / feet_y_axis);

back_stand_offset_height_extension = 3;

back_stand_offset_from_back = 6.5 + 2 * smoothing_padding;
back_stand_offset_height = 30 + back_stand_offset_height_extension - smoothing_padding;
back_stand_width = 15 - 2 * smoothing_padding;
back_stand_length = 5 - 2 * smoothing_padding;

module foot() {
    linear_extrude(height=(feet_depth + 1))
    resize([feet_y_axis,feet_x_axis])
    circle(r=1,$fn=100);
}

module feet() {
    translate([0,-feet_bottom_distance,0])
    rotate(a=-feet_angle,v=[0,0,1])
    foot();
    translate([0,feet_bottom_distance,0])
    rotate(a=feet_angle,v=[0,0,1])
    foot();
}

module layer_with_stand() {
    translate([smoothing_padding, smoothing_padding, 0])
    cube([final_layer_length - 2 * smoothing_padding, final_layer_width - 2 * smoothing_padding, layer_height - smoothing_padding]);
    translate([back_stand_offset_from_back - back_stand_length,final_layer_width / 2 -back_stand_width / 2,layer_height + smoothing_padding - back_stand_offset_height_extension])
    cube([back_stand_length, back_stand_width, back_stand_offset_height]);
}

module smooth_layer_with_stand() {
     minkowski() {
        // intersection so we don't go under z-axis
        intersection() {
            layer_with_stand();
            translate([0,0,smoothing_padding])
            cube([200,200,100]);
        }
        sphere(smoothing_padding);
    }
}

module layer4() {
    difference() {
        translate([-final_layer_length / 2, -final_layer_width / 2, 0])
        smooth_layer_with_stand();
        translate([0,0,layer_height - feet_depth])
        feet();
    }
}

module layer3() {
    layer_3_length = final_layer_length + layer_height - 2 * smoothing_padding;
    layer_3_width = final_layer_width + layer_height - 2 * smoothing_padding;
    translate([-layer_3_length / 2, -layer_3_width / 2, 0])
    minkowski() {
        // intersection so we don't go under z-axis
        intersection() {
            cube([layer_3_length, layer_3_width, layer_height - smoothing_padding]);
            translate([0,0,smoothing_padding])
            cube([200,200,100]);
        }
        sphere(smoothing_padding);
    }
}

module layer2() {
    layer_2_length = final_layer_length + 2 * layer_height - 2 * smoothing_padding;
    layer_2_width = final_layer_width + 2 * layer_height - 2 * smoothing_padding;
    translate([-layer_2_length / 2, -layer_2_width / 2, 0])
    minkowski() {
        // intersection so we don't go under z-axis
        intersection() {
            cube([layer_2_length, layer_2_width, layer_height - smoothing_padding]);
            translate([0,0,smoothing_padding])
            cube([200,200,100]);
        }
        sphere(smoothing_padding);
    }
}

layer_1_length = final_layer_length + 3 * layer_height - 2 * smoothing_padding;
layer_1_width = final_layer_width + 3 * layer_height - 2 * smoothing_padding;

module layer1() {
    translate([-layer_1_length / 2, -layer_1_width / 2, 0])
    minkowski() {
        // intersection so we don't go under z-axis
        intersection() {
            cube([layer_1_length, layer_1_width, layer_height - smoothing_padding]);
            translate([0,0,smoothing_padding])
            cube([200,200,100]);
        }
        sphere(smoothing_padding);
    }
}

module stand() {
    translate([0,0,layer_height * 3])
    layer4();
    translate([0,0,layer_height * 2])
    layer3();
    translate([0,0,layer_height])
    layer2();
    layer1();
}

pyramid_offset = 5;
pyramid_height = layer_height * 4 - pyramid_offset;
pyramid_length = layer_1_length - 2 * pyramid_offset;
pyramid_width = layer_1_width - 2 * pyramid_offset;

module pyramid() {
    polyhedron(
  points=[ [pyramid_length/2,pyramid_width/2,0],[pyramid_length/2,-pyramid_width/2,0],[-pyramid_length/2,-pyramid_width/2,0],[-pyramid_length/2,pyramid_width/2,0], // the four points at base
           [0,0,pyramid_height]  ],                                 // the apex point 
  faces=[ [0,1,4],[1,2,4],[2,3,4],[3,0,4],              // each triangle side
              [1,0,3],[2,1,3] ]                         // two triangles for square base
 );
}

module hollow_stand() {
    difference() {
        stand();
        pyramid();
    }
}

color("red")
translate([97.5,76,10])
hollow_stand();
